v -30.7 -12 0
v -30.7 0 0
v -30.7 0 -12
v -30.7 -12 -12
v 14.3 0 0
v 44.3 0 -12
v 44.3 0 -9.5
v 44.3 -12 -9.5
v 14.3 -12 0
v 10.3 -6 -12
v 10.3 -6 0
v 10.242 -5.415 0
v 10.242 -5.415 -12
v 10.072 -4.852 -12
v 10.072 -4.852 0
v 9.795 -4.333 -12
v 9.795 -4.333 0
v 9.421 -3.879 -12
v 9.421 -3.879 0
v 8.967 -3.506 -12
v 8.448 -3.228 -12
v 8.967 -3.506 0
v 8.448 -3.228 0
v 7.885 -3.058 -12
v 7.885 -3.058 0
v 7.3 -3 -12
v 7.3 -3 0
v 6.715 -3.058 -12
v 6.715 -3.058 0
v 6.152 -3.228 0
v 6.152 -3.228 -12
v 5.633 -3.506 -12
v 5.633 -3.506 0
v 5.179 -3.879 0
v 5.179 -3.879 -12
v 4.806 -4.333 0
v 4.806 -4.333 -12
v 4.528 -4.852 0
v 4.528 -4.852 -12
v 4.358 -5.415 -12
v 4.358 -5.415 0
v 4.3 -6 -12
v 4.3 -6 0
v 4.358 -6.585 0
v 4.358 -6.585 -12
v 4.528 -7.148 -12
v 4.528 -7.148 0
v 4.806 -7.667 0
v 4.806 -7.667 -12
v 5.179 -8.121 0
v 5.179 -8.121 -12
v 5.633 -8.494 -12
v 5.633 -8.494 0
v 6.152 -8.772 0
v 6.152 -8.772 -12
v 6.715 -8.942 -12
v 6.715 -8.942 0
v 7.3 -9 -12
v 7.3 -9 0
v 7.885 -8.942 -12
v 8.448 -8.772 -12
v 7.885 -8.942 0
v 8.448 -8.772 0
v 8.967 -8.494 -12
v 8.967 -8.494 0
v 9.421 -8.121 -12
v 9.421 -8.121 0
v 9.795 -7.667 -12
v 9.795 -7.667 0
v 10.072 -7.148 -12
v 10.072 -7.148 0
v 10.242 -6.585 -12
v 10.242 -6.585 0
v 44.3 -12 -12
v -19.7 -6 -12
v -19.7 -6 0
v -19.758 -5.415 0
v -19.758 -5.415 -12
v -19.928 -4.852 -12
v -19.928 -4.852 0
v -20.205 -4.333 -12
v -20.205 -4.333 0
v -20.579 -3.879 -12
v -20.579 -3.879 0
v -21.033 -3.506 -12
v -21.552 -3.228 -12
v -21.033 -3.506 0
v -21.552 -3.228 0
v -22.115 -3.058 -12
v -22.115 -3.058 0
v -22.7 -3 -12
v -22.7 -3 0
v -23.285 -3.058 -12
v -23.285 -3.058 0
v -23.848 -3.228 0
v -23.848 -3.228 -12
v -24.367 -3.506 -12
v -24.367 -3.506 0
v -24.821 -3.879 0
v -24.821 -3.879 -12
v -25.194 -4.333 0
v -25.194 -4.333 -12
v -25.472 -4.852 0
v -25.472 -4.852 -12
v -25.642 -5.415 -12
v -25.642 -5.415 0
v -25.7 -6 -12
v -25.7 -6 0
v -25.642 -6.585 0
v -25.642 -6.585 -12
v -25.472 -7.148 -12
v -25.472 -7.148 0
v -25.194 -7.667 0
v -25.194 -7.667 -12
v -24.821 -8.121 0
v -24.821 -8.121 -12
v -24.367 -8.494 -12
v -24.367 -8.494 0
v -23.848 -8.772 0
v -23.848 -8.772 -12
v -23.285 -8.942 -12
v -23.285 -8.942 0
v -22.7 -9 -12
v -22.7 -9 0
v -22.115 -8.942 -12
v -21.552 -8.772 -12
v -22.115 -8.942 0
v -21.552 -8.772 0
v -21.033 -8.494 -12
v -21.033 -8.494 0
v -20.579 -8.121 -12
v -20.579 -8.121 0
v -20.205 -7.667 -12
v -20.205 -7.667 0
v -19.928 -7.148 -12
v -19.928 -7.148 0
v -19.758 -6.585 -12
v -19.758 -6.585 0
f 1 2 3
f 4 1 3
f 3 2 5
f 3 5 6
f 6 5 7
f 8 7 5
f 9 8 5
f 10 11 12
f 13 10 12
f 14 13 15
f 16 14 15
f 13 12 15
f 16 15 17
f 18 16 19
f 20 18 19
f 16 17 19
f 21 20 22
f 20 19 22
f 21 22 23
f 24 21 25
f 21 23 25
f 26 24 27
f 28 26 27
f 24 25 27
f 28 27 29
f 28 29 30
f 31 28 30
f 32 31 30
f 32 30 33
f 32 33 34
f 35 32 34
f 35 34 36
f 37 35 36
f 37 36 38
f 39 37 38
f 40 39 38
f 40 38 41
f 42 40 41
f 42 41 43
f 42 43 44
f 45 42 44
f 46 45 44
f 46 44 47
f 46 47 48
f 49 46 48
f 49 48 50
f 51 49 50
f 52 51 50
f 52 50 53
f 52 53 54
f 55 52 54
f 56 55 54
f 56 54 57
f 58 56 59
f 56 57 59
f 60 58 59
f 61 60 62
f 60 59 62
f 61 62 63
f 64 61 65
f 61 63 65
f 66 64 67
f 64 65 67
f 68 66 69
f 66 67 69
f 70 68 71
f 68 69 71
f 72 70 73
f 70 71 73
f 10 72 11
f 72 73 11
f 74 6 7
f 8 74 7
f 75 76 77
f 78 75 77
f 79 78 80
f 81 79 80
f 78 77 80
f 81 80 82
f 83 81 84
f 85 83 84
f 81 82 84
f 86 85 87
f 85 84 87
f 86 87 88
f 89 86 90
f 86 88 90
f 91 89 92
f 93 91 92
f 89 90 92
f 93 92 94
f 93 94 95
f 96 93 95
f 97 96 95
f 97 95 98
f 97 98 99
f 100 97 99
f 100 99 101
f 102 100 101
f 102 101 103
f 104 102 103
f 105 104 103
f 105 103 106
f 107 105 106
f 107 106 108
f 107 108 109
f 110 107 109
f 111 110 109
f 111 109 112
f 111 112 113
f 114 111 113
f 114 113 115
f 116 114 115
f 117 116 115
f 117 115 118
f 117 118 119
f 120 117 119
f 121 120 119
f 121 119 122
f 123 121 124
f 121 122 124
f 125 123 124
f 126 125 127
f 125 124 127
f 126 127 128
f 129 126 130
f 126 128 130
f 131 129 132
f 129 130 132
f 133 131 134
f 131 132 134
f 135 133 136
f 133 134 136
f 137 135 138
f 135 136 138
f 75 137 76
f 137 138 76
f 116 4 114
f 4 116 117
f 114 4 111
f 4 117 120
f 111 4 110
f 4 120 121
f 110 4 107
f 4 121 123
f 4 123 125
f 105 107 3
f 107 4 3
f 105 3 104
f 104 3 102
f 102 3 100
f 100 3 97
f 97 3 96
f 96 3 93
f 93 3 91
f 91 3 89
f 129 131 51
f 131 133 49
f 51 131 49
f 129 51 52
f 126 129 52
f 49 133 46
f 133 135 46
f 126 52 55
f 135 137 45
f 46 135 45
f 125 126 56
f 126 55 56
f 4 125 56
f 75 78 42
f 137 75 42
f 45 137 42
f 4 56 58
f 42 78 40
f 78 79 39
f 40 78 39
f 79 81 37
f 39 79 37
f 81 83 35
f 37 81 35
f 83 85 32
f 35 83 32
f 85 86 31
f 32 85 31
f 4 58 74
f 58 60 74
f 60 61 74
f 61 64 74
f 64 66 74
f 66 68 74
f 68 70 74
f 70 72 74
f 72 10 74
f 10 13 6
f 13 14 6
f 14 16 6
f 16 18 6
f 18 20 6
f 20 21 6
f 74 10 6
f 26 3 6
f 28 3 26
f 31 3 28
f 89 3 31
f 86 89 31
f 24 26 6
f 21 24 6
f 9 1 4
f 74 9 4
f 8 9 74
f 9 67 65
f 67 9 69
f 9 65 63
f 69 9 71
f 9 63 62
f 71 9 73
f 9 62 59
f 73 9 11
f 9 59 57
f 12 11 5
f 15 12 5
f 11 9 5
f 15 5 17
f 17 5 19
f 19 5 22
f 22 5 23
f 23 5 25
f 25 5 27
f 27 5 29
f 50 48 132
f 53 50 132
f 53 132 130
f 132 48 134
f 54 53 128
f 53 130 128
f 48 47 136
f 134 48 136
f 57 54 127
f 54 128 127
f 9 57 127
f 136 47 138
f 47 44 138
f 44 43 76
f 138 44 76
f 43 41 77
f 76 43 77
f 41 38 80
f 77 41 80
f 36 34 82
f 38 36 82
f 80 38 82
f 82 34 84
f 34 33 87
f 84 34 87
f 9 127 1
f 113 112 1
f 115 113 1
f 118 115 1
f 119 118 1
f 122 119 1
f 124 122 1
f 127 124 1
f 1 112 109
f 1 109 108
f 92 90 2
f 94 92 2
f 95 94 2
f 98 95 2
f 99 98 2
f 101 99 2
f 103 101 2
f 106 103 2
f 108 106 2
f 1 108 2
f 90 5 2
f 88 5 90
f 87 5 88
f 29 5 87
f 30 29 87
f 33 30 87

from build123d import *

# Parameters (mm, degrees)
F1_DEPTH = 12
F2_R     = 3
F3_DEPTH = 12.001


with BuildPart() as f1:
    # F0 (on Front) → F1 (new body)
    with BuildSketch(Plane.XZ):
        Polygon((-30.699901, 0), (-30.699901, -12), (44.300099, -12), (44.300099, -9.5), (14.300099, 0), align=None)
    extrude(amount=F1_DEPTH)

    # F2 (on face) → F3 (cut, through all)
    with BuildSketch(Plane.XY):
        with Locations((-22.699901, -6)):
            Circle(F2_R)
        with Locations((7.300099, -6)):
            Circle(F2_R)
    extrude(amount=-F3_DEPTH, mode=Mode.SUBTRACT)


solid = f1.part
